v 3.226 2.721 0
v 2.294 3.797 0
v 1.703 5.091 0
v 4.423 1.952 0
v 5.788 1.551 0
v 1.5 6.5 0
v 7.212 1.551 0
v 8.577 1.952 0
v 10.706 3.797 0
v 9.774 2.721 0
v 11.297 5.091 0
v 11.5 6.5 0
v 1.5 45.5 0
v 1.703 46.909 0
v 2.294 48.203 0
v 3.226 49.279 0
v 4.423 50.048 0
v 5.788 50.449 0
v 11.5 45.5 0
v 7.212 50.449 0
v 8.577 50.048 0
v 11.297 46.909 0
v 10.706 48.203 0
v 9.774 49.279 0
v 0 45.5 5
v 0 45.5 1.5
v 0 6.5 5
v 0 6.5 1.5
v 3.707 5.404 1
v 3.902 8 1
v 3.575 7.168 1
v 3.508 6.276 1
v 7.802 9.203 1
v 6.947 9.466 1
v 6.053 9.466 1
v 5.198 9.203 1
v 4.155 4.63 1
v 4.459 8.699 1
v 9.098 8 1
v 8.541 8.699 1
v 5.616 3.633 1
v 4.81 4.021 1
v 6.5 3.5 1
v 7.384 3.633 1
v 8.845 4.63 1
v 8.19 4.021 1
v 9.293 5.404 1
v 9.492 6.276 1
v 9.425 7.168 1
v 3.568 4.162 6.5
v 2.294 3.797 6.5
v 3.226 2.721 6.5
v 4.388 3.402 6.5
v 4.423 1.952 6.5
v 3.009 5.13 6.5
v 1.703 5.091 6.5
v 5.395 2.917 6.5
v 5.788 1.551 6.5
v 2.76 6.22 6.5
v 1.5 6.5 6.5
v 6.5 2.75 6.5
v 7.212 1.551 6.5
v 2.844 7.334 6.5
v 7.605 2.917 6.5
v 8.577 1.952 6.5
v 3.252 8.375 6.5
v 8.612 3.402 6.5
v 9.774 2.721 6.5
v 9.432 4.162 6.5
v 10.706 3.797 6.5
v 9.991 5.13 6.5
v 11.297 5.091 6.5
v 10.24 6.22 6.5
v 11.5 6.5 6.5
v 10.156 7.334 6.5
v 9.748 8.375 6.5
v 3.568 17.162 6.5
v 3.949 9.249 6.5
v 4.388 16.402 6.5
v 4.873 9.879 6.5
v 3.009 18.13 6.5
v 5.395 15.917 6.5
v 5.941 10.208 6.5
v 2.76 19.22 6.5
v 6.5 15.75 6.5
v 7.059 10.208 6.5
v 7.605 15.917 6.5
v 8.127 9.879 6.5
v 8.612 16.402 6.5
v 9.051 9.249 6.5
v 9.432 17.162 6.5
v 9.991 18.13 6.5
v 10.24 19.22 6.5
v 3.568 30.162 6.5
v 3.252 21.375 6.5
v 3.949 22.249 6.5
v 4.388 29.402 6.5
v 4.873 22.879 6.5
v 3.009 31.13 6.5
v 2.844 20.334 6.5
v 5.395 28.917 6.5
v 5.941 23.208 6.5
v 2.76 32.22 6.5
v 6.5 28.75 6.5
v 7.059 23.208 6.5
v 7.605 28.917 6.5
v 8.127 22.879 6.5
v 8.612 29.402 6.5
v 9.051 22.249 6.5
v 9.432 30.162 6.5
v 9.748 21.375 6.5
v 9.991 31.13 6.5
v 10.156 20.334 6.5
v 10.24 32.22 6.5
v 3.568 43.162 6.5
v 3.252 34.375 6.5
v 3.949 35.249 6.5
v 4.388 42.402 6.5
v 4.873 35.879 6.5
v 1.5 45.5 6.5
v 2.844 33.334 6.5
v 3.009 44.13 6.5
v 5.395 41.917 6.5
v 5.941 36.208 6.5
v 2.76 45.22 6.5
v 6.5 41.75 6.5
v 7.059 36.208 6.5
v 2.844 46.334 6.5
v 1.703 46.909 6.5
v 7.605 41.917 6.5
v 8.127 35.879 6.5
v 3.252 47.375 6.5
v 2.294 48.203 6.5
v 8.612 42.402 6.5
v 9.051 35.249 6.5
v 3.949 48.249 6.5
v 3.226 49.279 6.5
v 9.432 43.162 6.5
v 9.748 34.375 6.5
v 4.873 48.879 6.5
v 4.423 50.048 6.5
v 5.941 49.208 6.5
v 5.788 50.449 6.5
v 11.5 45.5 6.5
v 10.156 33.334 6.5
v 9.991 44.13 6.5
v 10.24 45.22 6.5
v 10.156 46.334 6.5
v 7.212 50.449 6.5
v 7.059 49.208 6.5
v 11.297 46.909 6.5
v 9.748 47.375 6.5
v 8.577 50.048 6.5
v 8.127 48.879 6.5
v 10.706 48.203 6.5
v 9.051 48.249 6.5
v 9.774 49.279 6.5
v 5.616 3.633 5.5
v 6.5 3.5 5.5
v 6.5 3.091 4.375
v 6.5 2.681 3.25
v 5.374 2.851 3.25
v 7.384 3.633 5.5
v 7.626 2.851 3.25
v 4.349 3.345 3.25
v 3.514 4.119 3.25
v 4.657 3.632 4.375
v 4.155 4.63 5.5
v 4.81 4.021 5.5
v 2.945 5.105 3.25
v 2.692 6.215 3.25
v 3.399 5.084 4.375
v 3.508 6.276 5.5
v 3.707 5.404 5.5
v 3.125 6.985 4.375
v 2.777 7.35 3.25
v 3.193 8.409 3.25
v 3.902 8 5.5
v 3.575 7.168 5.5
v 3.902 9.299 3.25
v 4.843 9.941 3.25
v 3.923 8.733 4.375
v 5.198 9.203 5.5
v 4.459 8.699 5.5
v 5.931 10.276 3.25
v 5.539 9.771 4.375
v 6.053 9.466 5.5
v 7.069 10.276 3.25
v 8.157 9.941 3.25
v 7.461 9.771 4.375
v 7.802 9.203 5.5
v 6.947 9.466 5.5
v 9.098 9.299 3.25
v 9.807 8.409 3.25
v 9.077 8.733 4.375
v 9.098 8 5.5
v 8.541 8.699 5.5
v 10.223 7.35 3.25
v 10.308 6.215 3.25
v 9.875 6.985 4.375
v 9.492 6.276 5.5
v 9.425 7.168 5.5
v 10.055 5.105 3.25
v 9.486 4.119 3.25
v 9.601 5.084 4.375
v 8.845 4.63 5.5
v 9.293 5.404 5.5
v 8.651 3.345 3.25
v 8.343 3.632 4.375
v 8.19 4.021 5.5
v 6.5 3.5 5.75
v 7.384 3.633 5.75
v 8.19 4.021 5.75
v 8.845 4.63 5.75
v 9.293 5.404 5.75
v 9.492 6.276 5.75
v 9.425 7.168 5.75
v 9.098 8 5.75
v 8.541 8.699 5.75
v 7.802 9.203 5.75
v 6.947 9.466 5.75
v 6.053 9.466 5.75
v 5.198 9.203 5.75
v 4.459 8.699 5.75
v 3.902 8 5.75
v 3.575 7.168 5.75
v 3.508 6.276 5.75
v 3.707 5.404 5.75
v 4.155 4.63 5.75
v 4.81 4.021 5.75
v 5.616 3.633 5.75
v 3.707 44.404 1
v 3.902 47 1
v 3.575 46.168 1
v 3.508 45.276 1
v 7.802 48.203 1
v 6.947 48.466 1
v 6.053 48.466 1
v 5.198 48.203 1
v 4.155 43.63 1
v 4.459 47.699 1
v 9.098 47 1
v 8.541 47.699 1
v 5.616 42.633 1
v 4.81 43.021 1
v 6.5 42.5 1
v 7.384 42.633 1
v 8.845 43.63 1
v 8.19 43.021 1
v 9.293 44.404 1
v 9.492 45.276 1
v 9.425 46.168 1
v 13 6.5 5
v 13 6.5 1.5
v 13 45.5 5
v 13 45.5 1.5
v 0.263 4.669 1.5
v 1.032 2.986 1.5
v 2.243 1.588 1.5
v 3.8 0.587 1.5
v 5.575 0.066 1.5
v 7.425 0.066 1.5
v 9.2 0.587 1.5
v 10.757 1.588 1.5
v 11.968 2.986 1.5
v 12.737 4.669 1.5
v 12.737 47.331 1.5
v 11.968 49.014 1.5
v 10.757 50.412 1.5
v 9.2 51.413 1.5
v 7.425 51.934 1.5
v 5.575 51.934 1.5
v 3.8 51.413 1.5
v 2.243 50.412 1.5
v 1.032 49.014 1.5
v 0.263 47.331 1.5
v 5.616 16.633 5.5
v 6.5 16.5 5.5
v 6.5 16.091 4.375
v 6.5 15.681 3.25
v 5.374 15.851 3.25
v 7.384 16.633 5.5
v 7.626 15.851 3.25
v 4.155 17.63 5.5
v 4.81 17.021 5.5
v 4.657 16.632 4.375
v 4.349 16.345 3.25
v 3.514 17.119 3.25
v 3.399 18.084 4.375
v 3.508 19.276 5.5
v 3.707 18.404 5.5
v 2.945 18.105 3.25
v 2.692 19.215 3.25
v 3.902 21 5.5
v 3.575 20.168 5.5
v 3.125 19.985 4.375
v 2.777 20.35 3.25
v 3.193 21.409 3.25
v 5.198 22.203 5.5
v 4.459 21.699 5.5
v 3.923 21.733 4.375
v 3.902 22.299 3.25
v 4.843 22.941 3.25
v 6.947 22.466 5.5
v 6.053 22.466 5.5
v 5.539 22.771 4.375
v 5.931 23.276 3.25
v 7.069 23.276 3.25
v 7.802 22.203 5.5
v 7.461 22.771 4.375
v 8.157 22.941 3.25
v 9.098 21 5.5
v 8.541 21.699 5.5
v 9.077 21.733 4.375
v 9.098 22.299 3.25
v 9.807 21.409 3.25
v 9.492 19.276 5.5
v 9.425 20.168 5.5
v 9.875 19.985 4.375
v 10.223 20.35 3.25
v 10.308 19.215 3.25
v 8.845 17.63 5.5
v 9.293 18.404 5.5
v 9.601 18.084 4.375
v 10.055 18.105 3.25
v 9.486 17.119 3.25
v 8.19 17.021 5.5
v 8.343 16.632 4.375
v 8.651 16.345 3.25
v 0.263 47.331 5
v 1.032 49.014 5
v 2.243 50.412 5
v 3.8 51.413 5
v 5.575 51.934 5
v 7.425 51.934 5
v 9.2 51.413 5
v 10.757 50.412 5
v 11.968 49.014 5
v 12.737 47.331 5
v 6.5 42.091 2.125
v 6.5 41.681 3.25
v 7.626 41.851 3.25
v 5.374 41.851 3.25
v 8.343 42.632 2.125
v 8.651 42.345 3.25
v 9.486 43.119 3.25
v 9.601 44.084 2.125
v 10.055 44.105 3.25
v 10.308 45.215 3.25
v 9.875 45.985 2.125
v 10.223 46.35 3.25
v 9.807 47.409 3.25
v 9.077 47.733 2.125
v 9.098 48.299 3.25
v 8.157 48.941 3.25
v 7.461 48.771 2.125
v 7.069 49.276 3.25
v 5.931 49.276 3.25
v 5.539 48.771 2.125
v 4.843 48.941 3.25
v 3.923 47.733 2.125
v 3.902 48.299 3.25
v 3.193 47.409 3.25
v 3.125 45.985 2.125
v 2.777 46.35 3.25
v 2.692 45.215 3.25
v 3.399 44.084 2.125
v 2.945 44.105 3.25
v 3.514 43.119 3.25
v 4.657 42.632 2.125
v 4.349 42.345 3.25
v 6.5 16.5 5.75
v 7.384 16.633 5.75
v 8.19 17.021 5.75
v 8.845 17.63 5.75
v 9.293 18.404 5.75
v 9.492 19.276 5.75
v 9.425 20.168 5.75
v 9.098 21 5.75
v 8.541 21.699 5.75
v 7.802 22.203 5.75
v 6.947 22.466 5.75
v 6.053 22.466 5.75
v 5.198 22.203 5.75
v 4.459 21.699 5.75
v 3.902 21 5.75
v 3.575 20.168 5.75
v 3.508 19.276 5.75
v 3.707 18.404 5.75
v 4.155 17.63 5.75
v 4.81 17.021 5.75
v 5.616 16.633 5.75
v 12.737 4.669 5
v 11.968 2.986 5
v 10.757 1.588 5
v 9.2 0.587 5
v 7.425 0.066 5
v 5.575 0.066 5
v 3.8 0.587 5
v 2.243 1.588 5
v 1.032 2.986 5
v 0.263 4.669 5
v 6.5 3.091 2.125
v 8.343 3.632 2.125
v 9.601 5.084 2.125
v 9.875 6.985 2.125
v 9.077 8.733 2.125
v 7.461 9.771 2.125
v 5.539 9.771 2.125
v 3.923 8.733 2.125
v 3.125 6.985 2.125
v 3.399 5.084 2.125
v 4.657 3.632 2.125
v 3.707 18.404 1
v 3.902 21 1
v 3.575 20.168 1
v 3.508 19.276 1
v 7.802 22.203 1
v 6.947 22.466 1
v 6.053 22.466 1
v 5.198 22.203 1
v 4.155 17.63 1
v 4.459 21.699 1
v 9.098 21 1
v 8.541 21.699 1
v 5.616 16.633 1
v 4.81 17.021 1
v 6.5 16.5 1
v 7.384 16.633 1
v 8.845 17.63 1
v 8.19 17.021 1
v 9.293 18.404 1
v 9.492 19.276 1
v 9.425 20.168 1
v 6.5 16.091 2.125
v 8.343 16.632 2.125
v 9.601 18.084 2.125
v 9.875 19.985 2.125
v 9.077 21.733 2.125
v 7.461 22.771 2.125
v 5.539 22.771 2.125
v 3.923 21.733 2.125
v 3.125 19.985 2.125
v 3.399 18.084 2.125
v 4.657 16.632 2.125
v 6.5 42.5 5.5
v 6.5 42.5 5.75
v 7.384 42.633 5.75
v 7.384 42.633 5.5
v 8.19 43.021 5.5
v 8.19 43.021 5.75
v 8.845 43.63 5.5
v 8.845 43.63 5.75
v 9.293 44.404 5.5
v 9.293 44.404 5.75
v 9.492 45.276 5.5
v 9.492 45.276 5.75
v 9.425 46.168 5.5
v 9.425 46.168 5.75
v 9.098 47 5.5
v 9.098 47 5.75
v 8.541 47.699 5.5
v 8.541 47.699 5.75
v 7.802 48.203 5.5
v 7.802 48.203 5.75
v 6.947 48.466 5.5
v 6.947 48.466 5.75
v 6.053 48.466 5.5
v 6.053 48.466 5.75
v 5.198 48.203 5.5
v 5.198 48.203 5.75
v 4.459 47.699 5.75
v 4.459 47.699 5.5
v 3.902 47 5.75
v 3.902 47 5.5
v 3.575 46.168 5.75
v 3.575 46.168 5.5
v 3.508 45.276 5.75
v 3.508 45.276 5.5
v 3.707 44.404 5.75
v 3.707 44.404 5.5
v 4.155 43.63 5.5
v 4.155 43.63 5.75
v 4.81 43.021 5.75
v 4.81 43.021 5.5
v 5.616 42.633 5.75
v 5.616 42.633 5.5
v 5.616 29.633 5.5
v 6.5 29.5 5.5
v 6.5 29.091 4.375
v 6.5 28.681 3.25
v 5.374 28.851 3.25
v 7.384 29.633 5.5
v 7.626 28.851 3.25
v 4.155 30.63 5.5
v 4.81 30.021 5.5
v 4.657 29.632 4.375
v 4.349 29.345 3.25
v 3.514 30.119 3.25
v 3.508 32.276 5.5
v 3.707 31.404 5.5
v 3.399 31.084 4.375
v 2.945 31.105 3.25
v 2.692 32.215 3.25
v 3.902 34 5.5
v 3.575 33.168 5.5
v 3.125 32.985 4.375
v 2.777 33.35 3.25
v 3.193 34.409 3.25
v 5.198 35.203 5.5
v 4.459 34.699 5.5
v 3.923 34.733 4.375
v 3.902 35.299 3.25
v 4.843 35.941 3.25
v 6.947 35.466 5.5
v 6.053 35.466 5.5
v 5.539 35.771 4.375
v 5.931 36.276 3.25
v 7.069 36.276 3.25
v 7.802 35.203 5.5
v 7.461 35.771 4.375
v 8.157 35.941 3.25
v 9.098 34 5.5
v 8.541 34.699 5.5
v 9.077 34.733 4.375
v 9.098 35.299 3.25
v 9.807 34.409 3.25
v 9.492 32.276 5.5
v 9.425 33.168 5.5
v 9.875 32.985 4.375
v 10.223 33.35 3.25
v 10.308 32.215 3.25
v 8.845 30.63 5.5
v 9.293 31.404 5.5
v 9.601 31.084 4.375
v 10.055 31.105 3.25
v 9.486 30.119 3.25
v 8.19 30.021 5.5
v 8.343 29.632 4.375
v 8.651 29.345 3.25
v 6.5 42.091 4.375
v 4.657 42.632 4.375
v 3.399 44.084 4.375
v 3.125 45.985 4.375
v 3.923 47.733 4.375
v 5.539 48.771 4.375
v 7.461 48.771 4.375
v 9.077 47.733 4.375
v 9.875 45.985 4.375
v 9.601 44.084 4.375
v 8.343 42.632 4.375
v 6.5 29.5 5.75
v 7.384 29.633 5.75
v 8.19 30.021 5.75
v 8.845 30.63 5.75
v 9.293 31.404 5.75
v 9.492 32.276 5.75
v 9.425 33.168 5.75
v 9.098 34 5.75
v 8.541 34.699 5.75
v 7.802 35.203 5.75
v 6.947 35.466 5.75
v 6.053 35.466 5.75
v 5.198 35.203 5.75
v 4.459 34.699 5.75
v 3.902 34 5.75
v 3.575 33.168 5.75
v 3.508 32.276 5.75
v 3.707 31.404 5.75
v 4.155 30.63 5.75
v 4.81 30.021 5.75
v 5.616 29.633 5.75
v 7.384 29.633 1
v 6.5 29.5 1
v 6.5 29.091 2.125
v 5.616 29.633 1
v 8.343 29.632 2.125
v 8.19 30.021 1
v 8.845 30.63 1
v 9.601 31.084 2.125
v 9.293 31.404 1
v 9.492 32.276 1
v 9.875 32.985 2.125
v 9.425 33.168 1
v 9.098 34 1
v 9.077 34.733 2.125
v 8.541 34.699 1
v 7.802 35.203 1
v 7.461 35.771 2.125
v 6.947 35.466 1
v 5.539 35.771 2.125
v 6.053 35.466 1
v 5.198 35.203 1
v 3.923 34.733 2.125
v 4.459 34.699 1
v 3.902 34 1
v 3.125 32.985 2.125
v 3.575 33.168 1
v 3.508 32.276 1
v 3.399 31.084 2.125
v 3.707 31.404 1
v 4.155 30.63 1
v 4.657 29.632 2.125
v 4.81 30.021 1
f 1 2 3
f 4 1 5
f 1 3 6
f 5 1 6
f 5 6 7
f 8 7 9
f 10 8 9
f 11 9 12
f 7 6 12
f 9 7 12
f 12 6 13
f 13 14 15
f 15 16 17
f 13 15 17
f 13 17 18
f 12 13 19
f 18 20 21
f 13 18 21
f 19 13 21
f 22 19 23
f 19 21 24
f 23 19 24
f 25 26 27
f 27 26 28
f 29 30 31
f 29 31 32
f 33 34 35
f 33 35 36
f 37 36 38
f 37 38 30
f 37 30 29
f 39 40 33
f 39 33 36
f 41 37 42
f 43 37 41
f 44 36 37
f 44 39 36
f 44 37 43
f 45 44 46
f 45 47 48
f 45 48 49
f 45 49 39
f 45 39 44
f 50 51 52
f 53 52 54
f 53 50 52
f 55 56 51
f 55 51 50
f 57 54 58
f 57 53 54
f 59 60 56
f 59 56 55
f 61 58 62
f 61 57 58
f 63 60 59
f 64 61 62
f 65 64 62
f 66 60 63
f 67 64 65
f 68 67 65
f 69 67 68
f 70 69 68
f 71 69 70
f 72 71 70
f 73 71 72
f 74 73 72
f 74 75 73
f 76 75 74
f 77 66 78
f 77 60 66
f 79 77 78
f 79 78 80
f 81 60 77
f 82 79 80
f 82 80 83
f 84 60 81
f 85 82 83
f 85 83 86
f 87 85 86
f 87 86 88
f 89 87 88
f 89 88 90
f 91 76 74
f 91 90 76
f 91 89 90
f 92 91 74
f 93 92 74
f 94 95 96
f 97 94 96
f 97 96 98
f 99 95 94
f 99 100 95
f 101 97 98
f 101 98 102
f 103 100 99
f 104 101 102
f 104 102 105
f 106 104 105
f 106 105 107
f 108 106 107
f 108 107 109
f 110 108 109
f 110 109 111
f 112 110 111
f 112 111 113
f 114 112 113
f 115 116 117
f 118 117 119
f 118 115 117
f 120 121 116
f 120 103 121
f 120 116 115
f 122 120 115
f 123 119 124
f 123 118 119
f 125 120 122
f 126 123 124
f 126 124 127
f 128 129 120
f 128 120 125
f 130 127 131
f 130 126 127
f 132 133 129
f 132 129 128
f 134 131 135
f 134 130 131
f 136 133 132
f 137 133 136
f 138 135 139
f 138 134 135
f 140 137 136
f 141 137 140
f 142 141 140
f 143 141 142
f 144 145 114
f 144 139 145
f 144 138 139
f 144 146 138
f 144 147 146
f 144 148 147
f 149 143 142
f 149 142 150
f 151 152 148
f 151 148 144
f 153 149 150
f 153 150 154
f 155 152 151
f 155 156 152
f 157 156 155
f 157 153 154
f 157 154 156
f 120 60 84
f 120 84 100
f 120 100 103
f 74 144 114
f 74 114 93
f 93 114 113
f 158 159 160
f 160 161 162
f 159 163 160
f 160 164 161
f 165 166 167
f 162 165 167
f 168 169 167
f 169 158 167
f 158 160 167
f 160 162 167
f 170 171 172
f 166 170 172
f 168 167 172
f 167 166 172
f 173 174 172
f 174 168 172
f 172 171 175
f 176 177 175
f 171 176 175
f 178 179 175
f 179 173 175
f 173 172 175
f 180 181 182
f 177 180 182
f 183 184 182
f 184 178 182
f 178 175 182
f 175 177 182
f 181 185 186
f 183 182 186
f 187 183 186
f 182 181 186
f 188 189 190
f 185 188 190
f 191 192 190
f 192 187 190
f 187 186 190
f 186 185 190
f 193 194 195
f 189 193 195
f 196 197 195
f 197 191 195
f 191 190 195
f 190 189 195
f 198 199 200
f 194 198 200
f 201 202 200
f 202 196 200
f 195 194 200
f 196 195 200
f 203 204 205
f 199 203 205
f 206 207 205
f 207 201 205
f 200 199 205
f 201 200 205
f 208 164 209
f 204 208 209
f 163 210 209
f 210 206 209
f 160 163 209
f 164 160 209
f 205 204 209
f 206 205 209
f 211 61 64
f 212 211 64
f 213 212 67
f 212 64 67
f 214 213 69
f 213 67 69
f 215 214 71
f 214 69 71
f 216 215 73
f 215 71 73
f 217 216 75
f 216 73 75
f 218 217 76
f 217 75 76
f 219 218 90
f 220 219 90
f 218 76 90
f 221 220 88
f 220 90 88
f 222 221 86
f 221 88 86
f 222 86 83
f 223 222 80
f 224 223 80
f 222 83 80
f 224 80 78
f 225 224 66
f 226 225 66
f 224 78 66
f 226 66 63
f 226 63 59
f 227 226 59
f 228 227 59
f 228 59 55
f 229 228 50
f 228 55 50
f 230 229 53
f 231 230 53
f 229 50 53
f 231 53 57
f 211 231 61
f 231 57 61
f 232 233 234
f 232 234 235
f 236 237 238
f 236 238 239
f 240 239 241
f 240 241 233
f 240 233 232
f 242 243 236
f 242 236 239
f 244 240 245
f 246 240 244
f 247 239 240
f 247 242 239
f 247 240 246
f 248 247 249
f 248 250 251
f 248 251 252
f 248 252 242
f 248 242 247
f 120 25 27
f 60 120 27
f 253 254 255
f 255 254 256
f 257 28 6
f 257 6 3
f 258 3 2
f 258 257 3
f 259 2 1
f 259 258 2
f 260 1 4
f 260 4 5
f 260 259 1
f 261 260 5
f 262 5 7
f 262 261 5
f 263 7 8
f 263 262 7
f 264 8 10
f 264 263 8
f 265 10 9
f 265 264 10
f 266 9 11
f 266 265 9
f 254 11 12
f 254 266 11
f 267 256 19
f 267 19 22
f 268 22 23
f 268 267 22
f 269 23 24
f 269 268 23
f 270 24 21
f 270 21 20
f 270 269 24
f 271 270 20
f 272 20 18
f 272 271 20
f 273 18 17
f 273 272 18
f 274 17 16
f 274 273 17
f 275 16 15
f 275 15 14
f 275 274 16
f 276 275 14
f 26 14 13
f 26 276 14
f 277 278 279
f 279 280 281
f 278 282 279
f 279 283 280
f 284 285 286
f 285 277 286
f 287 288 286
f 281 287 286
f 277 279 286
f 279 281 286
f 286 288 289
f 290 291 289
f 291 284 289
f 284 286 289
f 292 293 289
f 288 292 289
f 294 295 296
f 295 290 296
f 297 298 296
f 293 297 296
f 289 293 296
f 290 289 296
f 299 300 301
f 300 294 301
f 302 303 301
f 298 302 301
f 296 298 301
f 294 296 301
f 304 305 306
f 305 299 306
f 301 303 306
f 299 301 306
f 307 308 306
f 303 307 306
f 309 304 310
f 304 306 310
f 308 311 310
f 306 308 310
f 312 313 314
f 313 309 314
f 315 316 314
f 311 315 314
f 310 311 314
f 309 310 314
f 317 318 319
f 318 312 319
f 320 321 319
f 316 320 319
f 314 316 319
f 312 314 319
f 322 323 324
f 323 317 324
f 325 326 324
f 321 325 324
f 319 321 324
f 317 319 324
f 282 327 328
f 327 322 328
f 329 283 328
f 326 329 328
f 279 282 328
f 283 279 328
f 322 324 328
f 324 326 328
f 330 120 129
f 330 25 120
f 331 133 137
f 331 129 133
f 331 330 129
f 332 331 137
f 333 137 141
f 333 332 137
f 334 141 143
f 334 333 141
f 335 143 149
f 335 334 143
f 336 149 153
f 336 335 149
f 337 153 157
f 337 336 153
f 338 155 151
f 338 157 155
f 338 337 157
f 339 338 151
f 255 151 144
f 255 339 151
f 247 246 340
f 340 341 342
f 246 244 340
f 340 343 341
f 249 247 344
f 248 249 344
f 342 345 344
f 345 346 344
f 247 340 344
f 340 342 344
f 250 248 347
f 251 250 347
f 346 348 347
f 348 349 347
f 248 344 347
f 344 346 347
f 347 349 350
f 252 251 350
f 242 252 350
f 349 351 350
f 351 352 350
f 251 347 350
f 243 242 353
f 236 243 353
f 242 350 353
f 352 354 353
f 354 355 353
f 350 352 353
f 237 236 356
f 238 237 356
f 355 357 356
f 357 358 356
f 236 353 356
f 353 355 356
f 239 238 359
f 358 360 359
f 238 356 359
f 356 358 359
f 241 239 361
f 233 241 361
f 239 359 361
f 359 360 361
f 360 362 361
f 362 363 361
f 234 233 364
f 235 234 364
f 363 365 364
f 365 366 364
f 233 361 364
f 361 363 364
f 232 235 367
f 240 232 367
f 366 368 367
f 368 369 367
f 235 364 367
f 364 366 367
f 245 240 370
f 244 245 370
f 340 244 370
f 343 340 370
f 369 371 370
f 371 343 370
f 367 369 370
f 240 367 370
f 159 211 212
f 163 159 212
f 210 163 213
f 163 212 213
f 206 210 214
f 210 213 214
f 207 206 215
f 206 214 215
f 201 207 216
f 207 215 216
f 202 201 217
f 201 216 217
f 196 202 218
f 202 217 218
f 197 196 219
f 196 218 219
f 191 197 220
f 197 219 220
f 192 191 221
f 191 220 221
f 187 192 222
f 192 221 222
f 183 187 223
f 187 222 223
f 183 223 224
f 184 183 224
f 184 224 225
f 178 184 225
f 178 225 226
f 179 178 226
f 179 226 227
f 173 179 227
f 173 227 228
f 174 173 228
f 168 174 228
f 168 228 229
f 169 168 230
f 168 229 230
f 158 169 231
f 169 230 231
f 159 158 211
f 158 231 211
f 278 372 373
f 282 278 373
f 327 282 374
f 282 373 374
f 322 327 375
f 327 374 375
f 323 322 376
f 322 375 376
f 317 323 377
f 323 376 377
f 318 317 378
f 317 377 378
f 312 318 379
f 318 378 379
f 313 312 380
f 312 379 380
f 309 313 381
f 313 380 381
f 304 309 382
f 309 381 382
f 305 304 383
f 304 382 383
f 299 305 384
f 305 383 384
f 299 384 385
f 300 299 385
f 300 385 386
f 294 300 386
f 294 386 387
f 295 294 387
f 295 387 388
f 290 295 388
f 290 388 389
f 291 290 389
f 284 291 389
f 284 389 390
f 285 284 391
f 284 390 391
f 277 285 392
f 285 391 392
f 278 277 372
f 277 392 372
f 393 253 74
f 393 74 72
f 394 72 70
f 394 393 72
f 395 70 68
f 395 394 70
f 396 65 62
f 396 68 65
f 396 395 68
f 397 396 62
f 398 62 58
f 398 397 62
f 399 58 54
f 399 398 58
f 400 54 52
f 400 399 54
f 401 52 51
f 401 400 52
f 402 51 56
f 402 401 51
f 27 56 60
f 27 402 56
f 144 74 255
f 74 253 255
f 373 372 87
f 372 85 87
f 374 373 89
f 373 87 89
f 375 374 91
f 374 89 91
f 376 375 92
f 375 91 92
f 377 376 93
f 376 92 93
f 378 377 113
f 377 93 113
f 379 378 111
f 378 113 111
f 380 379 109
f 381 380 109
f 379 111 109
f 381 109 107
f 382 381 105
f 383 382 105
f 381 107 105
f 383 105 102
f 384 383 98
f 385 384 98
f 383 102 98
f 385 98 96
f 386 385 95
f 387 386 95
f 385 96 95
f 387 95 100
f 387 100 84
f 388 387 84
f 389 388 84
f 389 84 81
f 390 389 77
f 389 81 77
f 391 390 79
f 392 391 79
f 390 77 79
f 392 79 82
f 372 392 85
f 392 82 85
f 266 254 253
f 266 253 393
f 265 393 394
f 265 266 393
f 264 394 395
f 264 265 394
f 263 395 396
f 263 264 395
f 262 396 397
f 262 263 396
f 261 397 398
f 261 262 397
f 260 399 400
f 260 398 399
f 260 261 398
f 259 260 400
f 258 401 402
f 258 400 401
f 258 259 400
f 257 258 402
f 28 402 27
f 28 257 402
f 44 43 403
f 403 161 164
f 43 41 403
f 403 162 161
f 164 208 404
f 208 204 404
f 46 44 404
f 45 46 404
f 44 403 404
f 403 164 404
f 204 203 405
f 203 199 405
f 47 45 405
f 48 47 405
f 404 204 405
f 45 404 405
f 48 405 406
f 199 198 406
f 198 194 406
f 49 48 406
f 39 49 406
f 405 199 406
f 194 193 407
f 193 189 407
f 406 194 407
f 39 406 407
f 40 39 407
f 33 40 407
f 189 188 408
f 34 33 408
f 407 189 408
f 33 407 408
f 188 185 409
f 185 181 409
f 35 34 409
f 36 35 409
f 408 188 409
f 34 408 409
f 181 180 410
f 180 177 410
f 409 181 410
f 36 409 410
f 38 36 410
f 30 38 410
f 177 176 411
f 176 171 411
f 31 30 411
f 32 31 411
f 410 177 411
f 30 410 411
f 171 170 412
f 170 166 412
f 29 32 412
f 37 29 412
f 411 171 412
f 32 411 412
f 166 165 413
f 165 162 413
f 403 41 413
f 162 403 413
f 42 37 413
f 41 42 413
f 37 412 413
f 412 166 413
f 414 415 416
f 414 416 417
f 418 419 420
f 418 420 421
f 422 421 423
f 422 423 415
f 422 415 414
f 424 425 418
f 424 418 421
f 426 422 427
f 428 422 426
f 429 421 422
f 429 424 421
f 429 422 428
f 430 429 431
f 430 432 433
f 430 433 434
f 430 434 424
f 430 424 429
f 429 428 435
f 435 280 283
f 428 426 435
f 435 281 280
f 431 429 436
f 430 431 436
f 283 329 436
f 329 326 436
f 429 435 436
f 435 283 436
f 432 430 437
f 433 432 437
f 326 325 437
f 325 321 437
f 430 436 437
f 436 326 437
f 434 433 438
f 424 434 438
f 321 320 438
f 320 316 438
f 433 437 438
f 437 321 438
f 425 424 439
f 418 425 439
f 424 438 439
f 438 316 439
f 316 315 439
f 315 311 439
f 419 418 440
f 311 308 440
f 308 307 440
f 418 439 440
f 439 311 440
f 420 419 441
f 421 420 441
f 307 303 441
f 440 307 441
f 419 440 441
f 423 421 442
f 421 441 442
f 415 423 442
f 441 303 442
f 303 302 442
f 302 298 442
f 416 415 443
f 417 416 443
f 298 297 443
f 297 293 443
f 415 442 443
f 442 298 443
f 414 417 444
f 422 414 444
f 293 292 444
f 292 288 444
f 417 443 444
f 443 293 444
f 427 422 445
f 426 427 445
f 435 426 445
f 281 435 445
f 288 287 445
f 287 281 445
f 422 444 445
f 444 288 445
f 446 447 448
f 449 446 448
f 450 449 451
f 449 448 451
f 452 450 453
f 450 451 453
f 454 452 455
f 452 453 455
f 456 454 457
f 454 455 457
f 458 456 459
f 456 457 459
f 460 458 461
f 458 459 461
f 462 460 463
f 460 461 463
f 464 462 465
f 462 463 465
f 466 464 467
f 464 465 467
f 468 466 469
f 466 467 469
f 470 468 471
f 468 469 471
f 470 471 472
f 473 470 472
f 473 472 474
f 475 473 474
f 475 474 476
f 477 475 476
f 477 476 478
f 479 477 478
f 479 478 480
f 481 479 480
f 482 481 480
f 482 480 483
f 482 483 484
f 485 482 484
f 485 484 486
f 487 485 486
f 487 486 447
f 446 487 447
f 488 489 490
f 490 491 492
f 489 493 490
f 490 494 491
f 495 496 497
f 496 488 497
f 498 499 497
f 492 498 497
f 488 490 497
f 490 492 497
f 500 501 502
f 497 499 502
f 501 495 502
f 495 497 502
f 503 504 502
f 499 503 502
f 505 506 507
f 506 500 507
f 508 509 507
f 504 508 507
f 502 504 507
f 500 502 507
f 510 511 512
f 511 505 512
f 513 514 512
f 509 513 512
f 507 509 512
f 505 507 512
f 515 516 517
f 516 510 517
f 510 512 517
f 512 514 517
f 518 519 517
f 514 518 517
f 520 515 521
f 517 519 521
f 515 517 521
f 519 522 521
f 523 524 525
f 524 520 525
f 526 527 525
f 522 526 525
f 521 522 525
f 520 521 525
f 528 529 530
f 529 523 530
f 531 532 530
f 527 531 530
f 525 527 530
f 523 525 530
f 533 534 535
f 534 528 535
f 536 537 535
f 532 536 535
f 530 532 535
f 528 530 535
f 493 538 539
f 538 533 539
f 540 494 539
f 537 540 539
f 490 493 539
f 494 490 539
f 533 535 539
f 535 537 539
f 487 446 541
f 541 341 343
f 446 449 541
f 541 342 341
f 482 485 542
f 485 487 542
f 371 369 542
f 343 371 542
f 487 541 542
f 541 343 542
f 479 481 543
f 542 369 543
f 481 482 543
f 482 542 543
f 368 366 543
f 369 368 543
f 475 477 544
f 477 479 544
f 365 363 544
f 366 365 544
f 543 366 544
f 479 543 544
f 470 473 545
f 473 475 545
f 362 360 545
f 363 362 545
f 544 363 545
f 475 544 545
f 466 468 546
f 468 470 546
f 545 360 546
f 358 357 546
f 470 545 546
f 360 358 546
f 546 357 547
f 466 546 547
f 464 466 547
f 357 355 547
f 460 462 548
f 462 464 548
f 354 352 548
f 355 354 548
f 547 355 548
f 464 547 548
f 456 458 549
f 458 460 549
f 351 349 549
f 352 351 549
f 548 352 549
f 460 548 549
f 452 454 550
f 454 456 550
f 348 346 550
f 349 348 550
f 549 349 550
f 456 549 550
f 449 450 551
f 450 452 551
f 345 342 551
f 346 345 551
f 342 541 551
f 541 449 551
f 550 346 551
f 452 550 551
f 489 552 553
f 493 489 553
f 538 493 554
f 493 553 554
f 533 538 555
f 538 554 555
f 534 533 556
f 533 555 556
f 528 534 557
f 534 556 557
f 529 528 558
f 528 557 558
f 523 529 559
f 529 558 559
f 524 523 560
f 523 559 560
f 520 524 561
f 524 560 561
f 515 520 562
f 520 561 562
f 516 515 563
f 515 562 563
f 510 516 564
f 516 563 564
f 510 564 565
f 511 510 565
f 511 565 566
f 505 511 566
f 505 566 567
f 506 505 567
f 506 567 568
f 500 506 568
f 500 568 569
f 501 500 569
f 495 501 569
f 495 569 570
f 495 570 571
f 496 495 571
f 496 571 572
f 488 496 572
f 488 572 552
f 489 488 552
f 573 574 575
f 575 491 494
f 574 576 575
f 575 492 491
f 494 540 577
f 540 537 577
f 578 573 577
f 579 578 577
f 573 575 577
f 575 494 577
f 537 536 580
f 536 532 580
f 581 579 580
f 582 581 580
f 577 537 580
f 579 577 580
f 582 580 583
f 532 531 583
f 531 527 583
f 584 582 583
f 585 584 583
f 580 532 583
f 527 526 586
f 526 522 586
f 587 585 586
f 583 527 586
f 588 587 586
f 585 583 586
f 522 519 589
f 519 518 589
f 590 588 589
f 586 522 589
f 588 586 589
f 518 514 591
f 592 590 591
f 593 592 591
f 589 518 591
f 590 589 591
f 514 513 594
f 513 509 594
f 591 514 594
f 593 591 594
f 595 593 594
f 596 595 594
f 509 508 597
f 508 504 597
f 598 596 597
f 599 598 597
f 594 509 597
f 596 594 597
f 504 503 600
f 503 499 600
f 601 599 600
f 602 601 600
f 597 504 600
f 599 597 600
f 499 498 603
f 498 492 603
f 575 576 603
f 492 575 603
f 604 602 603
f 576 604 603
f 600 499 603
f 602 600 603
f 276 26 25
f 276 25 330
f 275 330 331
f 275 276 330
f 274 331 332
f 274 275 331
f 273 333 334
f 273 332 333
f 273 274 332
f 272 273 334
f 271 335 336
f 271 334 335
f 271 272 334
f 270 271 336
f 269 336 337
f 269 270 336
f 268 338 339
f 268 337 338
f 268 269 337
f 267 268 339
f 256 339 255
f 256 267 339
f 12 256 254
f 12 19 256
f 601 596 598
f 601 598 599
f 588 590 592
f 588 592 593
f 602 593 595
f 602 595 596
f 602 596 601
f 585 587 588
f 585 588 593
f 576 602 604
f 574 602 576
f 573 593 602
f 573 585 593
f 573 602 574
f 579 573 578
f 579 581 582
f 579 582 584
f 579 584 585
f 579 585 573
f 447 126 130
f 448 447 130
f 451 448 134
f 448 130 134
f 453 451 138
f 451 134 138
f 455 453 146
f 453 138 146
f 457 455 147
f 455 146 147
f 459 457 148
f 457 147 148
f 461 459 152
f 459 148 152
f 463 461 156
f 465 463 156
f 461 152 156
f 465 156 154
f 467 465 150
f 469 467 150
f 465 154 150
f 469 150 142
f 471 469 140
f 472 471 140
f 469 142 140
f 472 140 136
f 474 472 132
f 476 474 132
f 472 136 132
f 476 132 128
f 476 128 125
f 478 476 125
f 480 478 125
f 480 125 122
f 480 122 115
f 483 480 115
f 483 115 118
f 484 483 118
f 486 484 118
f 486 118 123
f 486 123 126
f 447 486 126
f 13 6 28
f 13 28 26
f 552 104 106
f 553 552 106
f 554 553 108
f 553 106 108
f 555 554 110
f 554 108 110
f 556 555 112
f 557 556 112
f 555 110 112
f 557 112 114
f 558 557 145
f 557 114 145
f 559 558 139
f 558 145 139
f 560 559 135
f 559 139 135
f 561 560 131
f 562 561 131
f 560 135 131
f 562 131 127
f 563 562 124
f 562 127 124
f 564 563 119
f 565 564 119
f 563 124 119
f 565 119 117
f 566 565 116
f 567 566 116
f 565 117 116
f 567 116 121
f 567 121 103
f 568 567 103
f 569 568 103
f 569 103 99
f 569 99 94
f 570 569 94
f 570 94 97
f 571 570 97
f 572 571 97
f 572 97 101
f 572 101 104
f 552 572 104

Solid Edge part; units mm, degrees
sketch "Sketch1" plane through (0, 0, 0) normal (0, 0, 1) x (1, 0, 0)
  line L0 (0, 45.5) -> (0, 6.5)
  line L1 (13, 6.5) -> (13, 45.5)
  arc A0 (13, 6.5) -> (0, 6.5) centre (6.5, 6.5) cw
  arc A1 (0, 45.5) -> (13, 45.5) centre (6.5, 45.5) cw
extrude "Protrusion1" add sketch "Sketch1" along normal blind 6.5
sketch "Sketch2" plane through (6.5, 0, 0) normal (1, 0, 0) x (0, 1, 0)
  line L0 (3.5, 5.5) -> (3.5, 6.5)
  line L1 (3.5, 6.5) -> (6.5, 6.5)
  line L2 (6.5, 1) -> (6.5, 6.5)
  line L3 (3.5, 1) -> (6.5, 1)
  line L4 (3.5, 1) -> (2.6811, 3.25)
  line L5 (3.5, 5.5) -> (2.6811, 3.25)
revolve "RevolvedCutout1" cut sketch "Sketch2" angle 360 about axis through (6.5, 6.5, 1) along (0, 0, 1)
chamfer "Chaflán_38" distance 0.75 angle 45 1 edges at (6.5, 3.5, 6.5)
pattern_linear "Pattern1" count 4 spacing 13 along (0, 1, 0) of "RevolvedCutout1", "Chaflán_38"
chamfer "Chaflán_39" distance 1.5 angle 45 8 edges at (13, 26, 6.5) (6.5, 0, 6.5) (0, 26, 6.5) (6.5, 52, 6.5) (13, 26, 0) (6.5, 0, 0) (0, 26, 0) (6.5, 52, 0)
